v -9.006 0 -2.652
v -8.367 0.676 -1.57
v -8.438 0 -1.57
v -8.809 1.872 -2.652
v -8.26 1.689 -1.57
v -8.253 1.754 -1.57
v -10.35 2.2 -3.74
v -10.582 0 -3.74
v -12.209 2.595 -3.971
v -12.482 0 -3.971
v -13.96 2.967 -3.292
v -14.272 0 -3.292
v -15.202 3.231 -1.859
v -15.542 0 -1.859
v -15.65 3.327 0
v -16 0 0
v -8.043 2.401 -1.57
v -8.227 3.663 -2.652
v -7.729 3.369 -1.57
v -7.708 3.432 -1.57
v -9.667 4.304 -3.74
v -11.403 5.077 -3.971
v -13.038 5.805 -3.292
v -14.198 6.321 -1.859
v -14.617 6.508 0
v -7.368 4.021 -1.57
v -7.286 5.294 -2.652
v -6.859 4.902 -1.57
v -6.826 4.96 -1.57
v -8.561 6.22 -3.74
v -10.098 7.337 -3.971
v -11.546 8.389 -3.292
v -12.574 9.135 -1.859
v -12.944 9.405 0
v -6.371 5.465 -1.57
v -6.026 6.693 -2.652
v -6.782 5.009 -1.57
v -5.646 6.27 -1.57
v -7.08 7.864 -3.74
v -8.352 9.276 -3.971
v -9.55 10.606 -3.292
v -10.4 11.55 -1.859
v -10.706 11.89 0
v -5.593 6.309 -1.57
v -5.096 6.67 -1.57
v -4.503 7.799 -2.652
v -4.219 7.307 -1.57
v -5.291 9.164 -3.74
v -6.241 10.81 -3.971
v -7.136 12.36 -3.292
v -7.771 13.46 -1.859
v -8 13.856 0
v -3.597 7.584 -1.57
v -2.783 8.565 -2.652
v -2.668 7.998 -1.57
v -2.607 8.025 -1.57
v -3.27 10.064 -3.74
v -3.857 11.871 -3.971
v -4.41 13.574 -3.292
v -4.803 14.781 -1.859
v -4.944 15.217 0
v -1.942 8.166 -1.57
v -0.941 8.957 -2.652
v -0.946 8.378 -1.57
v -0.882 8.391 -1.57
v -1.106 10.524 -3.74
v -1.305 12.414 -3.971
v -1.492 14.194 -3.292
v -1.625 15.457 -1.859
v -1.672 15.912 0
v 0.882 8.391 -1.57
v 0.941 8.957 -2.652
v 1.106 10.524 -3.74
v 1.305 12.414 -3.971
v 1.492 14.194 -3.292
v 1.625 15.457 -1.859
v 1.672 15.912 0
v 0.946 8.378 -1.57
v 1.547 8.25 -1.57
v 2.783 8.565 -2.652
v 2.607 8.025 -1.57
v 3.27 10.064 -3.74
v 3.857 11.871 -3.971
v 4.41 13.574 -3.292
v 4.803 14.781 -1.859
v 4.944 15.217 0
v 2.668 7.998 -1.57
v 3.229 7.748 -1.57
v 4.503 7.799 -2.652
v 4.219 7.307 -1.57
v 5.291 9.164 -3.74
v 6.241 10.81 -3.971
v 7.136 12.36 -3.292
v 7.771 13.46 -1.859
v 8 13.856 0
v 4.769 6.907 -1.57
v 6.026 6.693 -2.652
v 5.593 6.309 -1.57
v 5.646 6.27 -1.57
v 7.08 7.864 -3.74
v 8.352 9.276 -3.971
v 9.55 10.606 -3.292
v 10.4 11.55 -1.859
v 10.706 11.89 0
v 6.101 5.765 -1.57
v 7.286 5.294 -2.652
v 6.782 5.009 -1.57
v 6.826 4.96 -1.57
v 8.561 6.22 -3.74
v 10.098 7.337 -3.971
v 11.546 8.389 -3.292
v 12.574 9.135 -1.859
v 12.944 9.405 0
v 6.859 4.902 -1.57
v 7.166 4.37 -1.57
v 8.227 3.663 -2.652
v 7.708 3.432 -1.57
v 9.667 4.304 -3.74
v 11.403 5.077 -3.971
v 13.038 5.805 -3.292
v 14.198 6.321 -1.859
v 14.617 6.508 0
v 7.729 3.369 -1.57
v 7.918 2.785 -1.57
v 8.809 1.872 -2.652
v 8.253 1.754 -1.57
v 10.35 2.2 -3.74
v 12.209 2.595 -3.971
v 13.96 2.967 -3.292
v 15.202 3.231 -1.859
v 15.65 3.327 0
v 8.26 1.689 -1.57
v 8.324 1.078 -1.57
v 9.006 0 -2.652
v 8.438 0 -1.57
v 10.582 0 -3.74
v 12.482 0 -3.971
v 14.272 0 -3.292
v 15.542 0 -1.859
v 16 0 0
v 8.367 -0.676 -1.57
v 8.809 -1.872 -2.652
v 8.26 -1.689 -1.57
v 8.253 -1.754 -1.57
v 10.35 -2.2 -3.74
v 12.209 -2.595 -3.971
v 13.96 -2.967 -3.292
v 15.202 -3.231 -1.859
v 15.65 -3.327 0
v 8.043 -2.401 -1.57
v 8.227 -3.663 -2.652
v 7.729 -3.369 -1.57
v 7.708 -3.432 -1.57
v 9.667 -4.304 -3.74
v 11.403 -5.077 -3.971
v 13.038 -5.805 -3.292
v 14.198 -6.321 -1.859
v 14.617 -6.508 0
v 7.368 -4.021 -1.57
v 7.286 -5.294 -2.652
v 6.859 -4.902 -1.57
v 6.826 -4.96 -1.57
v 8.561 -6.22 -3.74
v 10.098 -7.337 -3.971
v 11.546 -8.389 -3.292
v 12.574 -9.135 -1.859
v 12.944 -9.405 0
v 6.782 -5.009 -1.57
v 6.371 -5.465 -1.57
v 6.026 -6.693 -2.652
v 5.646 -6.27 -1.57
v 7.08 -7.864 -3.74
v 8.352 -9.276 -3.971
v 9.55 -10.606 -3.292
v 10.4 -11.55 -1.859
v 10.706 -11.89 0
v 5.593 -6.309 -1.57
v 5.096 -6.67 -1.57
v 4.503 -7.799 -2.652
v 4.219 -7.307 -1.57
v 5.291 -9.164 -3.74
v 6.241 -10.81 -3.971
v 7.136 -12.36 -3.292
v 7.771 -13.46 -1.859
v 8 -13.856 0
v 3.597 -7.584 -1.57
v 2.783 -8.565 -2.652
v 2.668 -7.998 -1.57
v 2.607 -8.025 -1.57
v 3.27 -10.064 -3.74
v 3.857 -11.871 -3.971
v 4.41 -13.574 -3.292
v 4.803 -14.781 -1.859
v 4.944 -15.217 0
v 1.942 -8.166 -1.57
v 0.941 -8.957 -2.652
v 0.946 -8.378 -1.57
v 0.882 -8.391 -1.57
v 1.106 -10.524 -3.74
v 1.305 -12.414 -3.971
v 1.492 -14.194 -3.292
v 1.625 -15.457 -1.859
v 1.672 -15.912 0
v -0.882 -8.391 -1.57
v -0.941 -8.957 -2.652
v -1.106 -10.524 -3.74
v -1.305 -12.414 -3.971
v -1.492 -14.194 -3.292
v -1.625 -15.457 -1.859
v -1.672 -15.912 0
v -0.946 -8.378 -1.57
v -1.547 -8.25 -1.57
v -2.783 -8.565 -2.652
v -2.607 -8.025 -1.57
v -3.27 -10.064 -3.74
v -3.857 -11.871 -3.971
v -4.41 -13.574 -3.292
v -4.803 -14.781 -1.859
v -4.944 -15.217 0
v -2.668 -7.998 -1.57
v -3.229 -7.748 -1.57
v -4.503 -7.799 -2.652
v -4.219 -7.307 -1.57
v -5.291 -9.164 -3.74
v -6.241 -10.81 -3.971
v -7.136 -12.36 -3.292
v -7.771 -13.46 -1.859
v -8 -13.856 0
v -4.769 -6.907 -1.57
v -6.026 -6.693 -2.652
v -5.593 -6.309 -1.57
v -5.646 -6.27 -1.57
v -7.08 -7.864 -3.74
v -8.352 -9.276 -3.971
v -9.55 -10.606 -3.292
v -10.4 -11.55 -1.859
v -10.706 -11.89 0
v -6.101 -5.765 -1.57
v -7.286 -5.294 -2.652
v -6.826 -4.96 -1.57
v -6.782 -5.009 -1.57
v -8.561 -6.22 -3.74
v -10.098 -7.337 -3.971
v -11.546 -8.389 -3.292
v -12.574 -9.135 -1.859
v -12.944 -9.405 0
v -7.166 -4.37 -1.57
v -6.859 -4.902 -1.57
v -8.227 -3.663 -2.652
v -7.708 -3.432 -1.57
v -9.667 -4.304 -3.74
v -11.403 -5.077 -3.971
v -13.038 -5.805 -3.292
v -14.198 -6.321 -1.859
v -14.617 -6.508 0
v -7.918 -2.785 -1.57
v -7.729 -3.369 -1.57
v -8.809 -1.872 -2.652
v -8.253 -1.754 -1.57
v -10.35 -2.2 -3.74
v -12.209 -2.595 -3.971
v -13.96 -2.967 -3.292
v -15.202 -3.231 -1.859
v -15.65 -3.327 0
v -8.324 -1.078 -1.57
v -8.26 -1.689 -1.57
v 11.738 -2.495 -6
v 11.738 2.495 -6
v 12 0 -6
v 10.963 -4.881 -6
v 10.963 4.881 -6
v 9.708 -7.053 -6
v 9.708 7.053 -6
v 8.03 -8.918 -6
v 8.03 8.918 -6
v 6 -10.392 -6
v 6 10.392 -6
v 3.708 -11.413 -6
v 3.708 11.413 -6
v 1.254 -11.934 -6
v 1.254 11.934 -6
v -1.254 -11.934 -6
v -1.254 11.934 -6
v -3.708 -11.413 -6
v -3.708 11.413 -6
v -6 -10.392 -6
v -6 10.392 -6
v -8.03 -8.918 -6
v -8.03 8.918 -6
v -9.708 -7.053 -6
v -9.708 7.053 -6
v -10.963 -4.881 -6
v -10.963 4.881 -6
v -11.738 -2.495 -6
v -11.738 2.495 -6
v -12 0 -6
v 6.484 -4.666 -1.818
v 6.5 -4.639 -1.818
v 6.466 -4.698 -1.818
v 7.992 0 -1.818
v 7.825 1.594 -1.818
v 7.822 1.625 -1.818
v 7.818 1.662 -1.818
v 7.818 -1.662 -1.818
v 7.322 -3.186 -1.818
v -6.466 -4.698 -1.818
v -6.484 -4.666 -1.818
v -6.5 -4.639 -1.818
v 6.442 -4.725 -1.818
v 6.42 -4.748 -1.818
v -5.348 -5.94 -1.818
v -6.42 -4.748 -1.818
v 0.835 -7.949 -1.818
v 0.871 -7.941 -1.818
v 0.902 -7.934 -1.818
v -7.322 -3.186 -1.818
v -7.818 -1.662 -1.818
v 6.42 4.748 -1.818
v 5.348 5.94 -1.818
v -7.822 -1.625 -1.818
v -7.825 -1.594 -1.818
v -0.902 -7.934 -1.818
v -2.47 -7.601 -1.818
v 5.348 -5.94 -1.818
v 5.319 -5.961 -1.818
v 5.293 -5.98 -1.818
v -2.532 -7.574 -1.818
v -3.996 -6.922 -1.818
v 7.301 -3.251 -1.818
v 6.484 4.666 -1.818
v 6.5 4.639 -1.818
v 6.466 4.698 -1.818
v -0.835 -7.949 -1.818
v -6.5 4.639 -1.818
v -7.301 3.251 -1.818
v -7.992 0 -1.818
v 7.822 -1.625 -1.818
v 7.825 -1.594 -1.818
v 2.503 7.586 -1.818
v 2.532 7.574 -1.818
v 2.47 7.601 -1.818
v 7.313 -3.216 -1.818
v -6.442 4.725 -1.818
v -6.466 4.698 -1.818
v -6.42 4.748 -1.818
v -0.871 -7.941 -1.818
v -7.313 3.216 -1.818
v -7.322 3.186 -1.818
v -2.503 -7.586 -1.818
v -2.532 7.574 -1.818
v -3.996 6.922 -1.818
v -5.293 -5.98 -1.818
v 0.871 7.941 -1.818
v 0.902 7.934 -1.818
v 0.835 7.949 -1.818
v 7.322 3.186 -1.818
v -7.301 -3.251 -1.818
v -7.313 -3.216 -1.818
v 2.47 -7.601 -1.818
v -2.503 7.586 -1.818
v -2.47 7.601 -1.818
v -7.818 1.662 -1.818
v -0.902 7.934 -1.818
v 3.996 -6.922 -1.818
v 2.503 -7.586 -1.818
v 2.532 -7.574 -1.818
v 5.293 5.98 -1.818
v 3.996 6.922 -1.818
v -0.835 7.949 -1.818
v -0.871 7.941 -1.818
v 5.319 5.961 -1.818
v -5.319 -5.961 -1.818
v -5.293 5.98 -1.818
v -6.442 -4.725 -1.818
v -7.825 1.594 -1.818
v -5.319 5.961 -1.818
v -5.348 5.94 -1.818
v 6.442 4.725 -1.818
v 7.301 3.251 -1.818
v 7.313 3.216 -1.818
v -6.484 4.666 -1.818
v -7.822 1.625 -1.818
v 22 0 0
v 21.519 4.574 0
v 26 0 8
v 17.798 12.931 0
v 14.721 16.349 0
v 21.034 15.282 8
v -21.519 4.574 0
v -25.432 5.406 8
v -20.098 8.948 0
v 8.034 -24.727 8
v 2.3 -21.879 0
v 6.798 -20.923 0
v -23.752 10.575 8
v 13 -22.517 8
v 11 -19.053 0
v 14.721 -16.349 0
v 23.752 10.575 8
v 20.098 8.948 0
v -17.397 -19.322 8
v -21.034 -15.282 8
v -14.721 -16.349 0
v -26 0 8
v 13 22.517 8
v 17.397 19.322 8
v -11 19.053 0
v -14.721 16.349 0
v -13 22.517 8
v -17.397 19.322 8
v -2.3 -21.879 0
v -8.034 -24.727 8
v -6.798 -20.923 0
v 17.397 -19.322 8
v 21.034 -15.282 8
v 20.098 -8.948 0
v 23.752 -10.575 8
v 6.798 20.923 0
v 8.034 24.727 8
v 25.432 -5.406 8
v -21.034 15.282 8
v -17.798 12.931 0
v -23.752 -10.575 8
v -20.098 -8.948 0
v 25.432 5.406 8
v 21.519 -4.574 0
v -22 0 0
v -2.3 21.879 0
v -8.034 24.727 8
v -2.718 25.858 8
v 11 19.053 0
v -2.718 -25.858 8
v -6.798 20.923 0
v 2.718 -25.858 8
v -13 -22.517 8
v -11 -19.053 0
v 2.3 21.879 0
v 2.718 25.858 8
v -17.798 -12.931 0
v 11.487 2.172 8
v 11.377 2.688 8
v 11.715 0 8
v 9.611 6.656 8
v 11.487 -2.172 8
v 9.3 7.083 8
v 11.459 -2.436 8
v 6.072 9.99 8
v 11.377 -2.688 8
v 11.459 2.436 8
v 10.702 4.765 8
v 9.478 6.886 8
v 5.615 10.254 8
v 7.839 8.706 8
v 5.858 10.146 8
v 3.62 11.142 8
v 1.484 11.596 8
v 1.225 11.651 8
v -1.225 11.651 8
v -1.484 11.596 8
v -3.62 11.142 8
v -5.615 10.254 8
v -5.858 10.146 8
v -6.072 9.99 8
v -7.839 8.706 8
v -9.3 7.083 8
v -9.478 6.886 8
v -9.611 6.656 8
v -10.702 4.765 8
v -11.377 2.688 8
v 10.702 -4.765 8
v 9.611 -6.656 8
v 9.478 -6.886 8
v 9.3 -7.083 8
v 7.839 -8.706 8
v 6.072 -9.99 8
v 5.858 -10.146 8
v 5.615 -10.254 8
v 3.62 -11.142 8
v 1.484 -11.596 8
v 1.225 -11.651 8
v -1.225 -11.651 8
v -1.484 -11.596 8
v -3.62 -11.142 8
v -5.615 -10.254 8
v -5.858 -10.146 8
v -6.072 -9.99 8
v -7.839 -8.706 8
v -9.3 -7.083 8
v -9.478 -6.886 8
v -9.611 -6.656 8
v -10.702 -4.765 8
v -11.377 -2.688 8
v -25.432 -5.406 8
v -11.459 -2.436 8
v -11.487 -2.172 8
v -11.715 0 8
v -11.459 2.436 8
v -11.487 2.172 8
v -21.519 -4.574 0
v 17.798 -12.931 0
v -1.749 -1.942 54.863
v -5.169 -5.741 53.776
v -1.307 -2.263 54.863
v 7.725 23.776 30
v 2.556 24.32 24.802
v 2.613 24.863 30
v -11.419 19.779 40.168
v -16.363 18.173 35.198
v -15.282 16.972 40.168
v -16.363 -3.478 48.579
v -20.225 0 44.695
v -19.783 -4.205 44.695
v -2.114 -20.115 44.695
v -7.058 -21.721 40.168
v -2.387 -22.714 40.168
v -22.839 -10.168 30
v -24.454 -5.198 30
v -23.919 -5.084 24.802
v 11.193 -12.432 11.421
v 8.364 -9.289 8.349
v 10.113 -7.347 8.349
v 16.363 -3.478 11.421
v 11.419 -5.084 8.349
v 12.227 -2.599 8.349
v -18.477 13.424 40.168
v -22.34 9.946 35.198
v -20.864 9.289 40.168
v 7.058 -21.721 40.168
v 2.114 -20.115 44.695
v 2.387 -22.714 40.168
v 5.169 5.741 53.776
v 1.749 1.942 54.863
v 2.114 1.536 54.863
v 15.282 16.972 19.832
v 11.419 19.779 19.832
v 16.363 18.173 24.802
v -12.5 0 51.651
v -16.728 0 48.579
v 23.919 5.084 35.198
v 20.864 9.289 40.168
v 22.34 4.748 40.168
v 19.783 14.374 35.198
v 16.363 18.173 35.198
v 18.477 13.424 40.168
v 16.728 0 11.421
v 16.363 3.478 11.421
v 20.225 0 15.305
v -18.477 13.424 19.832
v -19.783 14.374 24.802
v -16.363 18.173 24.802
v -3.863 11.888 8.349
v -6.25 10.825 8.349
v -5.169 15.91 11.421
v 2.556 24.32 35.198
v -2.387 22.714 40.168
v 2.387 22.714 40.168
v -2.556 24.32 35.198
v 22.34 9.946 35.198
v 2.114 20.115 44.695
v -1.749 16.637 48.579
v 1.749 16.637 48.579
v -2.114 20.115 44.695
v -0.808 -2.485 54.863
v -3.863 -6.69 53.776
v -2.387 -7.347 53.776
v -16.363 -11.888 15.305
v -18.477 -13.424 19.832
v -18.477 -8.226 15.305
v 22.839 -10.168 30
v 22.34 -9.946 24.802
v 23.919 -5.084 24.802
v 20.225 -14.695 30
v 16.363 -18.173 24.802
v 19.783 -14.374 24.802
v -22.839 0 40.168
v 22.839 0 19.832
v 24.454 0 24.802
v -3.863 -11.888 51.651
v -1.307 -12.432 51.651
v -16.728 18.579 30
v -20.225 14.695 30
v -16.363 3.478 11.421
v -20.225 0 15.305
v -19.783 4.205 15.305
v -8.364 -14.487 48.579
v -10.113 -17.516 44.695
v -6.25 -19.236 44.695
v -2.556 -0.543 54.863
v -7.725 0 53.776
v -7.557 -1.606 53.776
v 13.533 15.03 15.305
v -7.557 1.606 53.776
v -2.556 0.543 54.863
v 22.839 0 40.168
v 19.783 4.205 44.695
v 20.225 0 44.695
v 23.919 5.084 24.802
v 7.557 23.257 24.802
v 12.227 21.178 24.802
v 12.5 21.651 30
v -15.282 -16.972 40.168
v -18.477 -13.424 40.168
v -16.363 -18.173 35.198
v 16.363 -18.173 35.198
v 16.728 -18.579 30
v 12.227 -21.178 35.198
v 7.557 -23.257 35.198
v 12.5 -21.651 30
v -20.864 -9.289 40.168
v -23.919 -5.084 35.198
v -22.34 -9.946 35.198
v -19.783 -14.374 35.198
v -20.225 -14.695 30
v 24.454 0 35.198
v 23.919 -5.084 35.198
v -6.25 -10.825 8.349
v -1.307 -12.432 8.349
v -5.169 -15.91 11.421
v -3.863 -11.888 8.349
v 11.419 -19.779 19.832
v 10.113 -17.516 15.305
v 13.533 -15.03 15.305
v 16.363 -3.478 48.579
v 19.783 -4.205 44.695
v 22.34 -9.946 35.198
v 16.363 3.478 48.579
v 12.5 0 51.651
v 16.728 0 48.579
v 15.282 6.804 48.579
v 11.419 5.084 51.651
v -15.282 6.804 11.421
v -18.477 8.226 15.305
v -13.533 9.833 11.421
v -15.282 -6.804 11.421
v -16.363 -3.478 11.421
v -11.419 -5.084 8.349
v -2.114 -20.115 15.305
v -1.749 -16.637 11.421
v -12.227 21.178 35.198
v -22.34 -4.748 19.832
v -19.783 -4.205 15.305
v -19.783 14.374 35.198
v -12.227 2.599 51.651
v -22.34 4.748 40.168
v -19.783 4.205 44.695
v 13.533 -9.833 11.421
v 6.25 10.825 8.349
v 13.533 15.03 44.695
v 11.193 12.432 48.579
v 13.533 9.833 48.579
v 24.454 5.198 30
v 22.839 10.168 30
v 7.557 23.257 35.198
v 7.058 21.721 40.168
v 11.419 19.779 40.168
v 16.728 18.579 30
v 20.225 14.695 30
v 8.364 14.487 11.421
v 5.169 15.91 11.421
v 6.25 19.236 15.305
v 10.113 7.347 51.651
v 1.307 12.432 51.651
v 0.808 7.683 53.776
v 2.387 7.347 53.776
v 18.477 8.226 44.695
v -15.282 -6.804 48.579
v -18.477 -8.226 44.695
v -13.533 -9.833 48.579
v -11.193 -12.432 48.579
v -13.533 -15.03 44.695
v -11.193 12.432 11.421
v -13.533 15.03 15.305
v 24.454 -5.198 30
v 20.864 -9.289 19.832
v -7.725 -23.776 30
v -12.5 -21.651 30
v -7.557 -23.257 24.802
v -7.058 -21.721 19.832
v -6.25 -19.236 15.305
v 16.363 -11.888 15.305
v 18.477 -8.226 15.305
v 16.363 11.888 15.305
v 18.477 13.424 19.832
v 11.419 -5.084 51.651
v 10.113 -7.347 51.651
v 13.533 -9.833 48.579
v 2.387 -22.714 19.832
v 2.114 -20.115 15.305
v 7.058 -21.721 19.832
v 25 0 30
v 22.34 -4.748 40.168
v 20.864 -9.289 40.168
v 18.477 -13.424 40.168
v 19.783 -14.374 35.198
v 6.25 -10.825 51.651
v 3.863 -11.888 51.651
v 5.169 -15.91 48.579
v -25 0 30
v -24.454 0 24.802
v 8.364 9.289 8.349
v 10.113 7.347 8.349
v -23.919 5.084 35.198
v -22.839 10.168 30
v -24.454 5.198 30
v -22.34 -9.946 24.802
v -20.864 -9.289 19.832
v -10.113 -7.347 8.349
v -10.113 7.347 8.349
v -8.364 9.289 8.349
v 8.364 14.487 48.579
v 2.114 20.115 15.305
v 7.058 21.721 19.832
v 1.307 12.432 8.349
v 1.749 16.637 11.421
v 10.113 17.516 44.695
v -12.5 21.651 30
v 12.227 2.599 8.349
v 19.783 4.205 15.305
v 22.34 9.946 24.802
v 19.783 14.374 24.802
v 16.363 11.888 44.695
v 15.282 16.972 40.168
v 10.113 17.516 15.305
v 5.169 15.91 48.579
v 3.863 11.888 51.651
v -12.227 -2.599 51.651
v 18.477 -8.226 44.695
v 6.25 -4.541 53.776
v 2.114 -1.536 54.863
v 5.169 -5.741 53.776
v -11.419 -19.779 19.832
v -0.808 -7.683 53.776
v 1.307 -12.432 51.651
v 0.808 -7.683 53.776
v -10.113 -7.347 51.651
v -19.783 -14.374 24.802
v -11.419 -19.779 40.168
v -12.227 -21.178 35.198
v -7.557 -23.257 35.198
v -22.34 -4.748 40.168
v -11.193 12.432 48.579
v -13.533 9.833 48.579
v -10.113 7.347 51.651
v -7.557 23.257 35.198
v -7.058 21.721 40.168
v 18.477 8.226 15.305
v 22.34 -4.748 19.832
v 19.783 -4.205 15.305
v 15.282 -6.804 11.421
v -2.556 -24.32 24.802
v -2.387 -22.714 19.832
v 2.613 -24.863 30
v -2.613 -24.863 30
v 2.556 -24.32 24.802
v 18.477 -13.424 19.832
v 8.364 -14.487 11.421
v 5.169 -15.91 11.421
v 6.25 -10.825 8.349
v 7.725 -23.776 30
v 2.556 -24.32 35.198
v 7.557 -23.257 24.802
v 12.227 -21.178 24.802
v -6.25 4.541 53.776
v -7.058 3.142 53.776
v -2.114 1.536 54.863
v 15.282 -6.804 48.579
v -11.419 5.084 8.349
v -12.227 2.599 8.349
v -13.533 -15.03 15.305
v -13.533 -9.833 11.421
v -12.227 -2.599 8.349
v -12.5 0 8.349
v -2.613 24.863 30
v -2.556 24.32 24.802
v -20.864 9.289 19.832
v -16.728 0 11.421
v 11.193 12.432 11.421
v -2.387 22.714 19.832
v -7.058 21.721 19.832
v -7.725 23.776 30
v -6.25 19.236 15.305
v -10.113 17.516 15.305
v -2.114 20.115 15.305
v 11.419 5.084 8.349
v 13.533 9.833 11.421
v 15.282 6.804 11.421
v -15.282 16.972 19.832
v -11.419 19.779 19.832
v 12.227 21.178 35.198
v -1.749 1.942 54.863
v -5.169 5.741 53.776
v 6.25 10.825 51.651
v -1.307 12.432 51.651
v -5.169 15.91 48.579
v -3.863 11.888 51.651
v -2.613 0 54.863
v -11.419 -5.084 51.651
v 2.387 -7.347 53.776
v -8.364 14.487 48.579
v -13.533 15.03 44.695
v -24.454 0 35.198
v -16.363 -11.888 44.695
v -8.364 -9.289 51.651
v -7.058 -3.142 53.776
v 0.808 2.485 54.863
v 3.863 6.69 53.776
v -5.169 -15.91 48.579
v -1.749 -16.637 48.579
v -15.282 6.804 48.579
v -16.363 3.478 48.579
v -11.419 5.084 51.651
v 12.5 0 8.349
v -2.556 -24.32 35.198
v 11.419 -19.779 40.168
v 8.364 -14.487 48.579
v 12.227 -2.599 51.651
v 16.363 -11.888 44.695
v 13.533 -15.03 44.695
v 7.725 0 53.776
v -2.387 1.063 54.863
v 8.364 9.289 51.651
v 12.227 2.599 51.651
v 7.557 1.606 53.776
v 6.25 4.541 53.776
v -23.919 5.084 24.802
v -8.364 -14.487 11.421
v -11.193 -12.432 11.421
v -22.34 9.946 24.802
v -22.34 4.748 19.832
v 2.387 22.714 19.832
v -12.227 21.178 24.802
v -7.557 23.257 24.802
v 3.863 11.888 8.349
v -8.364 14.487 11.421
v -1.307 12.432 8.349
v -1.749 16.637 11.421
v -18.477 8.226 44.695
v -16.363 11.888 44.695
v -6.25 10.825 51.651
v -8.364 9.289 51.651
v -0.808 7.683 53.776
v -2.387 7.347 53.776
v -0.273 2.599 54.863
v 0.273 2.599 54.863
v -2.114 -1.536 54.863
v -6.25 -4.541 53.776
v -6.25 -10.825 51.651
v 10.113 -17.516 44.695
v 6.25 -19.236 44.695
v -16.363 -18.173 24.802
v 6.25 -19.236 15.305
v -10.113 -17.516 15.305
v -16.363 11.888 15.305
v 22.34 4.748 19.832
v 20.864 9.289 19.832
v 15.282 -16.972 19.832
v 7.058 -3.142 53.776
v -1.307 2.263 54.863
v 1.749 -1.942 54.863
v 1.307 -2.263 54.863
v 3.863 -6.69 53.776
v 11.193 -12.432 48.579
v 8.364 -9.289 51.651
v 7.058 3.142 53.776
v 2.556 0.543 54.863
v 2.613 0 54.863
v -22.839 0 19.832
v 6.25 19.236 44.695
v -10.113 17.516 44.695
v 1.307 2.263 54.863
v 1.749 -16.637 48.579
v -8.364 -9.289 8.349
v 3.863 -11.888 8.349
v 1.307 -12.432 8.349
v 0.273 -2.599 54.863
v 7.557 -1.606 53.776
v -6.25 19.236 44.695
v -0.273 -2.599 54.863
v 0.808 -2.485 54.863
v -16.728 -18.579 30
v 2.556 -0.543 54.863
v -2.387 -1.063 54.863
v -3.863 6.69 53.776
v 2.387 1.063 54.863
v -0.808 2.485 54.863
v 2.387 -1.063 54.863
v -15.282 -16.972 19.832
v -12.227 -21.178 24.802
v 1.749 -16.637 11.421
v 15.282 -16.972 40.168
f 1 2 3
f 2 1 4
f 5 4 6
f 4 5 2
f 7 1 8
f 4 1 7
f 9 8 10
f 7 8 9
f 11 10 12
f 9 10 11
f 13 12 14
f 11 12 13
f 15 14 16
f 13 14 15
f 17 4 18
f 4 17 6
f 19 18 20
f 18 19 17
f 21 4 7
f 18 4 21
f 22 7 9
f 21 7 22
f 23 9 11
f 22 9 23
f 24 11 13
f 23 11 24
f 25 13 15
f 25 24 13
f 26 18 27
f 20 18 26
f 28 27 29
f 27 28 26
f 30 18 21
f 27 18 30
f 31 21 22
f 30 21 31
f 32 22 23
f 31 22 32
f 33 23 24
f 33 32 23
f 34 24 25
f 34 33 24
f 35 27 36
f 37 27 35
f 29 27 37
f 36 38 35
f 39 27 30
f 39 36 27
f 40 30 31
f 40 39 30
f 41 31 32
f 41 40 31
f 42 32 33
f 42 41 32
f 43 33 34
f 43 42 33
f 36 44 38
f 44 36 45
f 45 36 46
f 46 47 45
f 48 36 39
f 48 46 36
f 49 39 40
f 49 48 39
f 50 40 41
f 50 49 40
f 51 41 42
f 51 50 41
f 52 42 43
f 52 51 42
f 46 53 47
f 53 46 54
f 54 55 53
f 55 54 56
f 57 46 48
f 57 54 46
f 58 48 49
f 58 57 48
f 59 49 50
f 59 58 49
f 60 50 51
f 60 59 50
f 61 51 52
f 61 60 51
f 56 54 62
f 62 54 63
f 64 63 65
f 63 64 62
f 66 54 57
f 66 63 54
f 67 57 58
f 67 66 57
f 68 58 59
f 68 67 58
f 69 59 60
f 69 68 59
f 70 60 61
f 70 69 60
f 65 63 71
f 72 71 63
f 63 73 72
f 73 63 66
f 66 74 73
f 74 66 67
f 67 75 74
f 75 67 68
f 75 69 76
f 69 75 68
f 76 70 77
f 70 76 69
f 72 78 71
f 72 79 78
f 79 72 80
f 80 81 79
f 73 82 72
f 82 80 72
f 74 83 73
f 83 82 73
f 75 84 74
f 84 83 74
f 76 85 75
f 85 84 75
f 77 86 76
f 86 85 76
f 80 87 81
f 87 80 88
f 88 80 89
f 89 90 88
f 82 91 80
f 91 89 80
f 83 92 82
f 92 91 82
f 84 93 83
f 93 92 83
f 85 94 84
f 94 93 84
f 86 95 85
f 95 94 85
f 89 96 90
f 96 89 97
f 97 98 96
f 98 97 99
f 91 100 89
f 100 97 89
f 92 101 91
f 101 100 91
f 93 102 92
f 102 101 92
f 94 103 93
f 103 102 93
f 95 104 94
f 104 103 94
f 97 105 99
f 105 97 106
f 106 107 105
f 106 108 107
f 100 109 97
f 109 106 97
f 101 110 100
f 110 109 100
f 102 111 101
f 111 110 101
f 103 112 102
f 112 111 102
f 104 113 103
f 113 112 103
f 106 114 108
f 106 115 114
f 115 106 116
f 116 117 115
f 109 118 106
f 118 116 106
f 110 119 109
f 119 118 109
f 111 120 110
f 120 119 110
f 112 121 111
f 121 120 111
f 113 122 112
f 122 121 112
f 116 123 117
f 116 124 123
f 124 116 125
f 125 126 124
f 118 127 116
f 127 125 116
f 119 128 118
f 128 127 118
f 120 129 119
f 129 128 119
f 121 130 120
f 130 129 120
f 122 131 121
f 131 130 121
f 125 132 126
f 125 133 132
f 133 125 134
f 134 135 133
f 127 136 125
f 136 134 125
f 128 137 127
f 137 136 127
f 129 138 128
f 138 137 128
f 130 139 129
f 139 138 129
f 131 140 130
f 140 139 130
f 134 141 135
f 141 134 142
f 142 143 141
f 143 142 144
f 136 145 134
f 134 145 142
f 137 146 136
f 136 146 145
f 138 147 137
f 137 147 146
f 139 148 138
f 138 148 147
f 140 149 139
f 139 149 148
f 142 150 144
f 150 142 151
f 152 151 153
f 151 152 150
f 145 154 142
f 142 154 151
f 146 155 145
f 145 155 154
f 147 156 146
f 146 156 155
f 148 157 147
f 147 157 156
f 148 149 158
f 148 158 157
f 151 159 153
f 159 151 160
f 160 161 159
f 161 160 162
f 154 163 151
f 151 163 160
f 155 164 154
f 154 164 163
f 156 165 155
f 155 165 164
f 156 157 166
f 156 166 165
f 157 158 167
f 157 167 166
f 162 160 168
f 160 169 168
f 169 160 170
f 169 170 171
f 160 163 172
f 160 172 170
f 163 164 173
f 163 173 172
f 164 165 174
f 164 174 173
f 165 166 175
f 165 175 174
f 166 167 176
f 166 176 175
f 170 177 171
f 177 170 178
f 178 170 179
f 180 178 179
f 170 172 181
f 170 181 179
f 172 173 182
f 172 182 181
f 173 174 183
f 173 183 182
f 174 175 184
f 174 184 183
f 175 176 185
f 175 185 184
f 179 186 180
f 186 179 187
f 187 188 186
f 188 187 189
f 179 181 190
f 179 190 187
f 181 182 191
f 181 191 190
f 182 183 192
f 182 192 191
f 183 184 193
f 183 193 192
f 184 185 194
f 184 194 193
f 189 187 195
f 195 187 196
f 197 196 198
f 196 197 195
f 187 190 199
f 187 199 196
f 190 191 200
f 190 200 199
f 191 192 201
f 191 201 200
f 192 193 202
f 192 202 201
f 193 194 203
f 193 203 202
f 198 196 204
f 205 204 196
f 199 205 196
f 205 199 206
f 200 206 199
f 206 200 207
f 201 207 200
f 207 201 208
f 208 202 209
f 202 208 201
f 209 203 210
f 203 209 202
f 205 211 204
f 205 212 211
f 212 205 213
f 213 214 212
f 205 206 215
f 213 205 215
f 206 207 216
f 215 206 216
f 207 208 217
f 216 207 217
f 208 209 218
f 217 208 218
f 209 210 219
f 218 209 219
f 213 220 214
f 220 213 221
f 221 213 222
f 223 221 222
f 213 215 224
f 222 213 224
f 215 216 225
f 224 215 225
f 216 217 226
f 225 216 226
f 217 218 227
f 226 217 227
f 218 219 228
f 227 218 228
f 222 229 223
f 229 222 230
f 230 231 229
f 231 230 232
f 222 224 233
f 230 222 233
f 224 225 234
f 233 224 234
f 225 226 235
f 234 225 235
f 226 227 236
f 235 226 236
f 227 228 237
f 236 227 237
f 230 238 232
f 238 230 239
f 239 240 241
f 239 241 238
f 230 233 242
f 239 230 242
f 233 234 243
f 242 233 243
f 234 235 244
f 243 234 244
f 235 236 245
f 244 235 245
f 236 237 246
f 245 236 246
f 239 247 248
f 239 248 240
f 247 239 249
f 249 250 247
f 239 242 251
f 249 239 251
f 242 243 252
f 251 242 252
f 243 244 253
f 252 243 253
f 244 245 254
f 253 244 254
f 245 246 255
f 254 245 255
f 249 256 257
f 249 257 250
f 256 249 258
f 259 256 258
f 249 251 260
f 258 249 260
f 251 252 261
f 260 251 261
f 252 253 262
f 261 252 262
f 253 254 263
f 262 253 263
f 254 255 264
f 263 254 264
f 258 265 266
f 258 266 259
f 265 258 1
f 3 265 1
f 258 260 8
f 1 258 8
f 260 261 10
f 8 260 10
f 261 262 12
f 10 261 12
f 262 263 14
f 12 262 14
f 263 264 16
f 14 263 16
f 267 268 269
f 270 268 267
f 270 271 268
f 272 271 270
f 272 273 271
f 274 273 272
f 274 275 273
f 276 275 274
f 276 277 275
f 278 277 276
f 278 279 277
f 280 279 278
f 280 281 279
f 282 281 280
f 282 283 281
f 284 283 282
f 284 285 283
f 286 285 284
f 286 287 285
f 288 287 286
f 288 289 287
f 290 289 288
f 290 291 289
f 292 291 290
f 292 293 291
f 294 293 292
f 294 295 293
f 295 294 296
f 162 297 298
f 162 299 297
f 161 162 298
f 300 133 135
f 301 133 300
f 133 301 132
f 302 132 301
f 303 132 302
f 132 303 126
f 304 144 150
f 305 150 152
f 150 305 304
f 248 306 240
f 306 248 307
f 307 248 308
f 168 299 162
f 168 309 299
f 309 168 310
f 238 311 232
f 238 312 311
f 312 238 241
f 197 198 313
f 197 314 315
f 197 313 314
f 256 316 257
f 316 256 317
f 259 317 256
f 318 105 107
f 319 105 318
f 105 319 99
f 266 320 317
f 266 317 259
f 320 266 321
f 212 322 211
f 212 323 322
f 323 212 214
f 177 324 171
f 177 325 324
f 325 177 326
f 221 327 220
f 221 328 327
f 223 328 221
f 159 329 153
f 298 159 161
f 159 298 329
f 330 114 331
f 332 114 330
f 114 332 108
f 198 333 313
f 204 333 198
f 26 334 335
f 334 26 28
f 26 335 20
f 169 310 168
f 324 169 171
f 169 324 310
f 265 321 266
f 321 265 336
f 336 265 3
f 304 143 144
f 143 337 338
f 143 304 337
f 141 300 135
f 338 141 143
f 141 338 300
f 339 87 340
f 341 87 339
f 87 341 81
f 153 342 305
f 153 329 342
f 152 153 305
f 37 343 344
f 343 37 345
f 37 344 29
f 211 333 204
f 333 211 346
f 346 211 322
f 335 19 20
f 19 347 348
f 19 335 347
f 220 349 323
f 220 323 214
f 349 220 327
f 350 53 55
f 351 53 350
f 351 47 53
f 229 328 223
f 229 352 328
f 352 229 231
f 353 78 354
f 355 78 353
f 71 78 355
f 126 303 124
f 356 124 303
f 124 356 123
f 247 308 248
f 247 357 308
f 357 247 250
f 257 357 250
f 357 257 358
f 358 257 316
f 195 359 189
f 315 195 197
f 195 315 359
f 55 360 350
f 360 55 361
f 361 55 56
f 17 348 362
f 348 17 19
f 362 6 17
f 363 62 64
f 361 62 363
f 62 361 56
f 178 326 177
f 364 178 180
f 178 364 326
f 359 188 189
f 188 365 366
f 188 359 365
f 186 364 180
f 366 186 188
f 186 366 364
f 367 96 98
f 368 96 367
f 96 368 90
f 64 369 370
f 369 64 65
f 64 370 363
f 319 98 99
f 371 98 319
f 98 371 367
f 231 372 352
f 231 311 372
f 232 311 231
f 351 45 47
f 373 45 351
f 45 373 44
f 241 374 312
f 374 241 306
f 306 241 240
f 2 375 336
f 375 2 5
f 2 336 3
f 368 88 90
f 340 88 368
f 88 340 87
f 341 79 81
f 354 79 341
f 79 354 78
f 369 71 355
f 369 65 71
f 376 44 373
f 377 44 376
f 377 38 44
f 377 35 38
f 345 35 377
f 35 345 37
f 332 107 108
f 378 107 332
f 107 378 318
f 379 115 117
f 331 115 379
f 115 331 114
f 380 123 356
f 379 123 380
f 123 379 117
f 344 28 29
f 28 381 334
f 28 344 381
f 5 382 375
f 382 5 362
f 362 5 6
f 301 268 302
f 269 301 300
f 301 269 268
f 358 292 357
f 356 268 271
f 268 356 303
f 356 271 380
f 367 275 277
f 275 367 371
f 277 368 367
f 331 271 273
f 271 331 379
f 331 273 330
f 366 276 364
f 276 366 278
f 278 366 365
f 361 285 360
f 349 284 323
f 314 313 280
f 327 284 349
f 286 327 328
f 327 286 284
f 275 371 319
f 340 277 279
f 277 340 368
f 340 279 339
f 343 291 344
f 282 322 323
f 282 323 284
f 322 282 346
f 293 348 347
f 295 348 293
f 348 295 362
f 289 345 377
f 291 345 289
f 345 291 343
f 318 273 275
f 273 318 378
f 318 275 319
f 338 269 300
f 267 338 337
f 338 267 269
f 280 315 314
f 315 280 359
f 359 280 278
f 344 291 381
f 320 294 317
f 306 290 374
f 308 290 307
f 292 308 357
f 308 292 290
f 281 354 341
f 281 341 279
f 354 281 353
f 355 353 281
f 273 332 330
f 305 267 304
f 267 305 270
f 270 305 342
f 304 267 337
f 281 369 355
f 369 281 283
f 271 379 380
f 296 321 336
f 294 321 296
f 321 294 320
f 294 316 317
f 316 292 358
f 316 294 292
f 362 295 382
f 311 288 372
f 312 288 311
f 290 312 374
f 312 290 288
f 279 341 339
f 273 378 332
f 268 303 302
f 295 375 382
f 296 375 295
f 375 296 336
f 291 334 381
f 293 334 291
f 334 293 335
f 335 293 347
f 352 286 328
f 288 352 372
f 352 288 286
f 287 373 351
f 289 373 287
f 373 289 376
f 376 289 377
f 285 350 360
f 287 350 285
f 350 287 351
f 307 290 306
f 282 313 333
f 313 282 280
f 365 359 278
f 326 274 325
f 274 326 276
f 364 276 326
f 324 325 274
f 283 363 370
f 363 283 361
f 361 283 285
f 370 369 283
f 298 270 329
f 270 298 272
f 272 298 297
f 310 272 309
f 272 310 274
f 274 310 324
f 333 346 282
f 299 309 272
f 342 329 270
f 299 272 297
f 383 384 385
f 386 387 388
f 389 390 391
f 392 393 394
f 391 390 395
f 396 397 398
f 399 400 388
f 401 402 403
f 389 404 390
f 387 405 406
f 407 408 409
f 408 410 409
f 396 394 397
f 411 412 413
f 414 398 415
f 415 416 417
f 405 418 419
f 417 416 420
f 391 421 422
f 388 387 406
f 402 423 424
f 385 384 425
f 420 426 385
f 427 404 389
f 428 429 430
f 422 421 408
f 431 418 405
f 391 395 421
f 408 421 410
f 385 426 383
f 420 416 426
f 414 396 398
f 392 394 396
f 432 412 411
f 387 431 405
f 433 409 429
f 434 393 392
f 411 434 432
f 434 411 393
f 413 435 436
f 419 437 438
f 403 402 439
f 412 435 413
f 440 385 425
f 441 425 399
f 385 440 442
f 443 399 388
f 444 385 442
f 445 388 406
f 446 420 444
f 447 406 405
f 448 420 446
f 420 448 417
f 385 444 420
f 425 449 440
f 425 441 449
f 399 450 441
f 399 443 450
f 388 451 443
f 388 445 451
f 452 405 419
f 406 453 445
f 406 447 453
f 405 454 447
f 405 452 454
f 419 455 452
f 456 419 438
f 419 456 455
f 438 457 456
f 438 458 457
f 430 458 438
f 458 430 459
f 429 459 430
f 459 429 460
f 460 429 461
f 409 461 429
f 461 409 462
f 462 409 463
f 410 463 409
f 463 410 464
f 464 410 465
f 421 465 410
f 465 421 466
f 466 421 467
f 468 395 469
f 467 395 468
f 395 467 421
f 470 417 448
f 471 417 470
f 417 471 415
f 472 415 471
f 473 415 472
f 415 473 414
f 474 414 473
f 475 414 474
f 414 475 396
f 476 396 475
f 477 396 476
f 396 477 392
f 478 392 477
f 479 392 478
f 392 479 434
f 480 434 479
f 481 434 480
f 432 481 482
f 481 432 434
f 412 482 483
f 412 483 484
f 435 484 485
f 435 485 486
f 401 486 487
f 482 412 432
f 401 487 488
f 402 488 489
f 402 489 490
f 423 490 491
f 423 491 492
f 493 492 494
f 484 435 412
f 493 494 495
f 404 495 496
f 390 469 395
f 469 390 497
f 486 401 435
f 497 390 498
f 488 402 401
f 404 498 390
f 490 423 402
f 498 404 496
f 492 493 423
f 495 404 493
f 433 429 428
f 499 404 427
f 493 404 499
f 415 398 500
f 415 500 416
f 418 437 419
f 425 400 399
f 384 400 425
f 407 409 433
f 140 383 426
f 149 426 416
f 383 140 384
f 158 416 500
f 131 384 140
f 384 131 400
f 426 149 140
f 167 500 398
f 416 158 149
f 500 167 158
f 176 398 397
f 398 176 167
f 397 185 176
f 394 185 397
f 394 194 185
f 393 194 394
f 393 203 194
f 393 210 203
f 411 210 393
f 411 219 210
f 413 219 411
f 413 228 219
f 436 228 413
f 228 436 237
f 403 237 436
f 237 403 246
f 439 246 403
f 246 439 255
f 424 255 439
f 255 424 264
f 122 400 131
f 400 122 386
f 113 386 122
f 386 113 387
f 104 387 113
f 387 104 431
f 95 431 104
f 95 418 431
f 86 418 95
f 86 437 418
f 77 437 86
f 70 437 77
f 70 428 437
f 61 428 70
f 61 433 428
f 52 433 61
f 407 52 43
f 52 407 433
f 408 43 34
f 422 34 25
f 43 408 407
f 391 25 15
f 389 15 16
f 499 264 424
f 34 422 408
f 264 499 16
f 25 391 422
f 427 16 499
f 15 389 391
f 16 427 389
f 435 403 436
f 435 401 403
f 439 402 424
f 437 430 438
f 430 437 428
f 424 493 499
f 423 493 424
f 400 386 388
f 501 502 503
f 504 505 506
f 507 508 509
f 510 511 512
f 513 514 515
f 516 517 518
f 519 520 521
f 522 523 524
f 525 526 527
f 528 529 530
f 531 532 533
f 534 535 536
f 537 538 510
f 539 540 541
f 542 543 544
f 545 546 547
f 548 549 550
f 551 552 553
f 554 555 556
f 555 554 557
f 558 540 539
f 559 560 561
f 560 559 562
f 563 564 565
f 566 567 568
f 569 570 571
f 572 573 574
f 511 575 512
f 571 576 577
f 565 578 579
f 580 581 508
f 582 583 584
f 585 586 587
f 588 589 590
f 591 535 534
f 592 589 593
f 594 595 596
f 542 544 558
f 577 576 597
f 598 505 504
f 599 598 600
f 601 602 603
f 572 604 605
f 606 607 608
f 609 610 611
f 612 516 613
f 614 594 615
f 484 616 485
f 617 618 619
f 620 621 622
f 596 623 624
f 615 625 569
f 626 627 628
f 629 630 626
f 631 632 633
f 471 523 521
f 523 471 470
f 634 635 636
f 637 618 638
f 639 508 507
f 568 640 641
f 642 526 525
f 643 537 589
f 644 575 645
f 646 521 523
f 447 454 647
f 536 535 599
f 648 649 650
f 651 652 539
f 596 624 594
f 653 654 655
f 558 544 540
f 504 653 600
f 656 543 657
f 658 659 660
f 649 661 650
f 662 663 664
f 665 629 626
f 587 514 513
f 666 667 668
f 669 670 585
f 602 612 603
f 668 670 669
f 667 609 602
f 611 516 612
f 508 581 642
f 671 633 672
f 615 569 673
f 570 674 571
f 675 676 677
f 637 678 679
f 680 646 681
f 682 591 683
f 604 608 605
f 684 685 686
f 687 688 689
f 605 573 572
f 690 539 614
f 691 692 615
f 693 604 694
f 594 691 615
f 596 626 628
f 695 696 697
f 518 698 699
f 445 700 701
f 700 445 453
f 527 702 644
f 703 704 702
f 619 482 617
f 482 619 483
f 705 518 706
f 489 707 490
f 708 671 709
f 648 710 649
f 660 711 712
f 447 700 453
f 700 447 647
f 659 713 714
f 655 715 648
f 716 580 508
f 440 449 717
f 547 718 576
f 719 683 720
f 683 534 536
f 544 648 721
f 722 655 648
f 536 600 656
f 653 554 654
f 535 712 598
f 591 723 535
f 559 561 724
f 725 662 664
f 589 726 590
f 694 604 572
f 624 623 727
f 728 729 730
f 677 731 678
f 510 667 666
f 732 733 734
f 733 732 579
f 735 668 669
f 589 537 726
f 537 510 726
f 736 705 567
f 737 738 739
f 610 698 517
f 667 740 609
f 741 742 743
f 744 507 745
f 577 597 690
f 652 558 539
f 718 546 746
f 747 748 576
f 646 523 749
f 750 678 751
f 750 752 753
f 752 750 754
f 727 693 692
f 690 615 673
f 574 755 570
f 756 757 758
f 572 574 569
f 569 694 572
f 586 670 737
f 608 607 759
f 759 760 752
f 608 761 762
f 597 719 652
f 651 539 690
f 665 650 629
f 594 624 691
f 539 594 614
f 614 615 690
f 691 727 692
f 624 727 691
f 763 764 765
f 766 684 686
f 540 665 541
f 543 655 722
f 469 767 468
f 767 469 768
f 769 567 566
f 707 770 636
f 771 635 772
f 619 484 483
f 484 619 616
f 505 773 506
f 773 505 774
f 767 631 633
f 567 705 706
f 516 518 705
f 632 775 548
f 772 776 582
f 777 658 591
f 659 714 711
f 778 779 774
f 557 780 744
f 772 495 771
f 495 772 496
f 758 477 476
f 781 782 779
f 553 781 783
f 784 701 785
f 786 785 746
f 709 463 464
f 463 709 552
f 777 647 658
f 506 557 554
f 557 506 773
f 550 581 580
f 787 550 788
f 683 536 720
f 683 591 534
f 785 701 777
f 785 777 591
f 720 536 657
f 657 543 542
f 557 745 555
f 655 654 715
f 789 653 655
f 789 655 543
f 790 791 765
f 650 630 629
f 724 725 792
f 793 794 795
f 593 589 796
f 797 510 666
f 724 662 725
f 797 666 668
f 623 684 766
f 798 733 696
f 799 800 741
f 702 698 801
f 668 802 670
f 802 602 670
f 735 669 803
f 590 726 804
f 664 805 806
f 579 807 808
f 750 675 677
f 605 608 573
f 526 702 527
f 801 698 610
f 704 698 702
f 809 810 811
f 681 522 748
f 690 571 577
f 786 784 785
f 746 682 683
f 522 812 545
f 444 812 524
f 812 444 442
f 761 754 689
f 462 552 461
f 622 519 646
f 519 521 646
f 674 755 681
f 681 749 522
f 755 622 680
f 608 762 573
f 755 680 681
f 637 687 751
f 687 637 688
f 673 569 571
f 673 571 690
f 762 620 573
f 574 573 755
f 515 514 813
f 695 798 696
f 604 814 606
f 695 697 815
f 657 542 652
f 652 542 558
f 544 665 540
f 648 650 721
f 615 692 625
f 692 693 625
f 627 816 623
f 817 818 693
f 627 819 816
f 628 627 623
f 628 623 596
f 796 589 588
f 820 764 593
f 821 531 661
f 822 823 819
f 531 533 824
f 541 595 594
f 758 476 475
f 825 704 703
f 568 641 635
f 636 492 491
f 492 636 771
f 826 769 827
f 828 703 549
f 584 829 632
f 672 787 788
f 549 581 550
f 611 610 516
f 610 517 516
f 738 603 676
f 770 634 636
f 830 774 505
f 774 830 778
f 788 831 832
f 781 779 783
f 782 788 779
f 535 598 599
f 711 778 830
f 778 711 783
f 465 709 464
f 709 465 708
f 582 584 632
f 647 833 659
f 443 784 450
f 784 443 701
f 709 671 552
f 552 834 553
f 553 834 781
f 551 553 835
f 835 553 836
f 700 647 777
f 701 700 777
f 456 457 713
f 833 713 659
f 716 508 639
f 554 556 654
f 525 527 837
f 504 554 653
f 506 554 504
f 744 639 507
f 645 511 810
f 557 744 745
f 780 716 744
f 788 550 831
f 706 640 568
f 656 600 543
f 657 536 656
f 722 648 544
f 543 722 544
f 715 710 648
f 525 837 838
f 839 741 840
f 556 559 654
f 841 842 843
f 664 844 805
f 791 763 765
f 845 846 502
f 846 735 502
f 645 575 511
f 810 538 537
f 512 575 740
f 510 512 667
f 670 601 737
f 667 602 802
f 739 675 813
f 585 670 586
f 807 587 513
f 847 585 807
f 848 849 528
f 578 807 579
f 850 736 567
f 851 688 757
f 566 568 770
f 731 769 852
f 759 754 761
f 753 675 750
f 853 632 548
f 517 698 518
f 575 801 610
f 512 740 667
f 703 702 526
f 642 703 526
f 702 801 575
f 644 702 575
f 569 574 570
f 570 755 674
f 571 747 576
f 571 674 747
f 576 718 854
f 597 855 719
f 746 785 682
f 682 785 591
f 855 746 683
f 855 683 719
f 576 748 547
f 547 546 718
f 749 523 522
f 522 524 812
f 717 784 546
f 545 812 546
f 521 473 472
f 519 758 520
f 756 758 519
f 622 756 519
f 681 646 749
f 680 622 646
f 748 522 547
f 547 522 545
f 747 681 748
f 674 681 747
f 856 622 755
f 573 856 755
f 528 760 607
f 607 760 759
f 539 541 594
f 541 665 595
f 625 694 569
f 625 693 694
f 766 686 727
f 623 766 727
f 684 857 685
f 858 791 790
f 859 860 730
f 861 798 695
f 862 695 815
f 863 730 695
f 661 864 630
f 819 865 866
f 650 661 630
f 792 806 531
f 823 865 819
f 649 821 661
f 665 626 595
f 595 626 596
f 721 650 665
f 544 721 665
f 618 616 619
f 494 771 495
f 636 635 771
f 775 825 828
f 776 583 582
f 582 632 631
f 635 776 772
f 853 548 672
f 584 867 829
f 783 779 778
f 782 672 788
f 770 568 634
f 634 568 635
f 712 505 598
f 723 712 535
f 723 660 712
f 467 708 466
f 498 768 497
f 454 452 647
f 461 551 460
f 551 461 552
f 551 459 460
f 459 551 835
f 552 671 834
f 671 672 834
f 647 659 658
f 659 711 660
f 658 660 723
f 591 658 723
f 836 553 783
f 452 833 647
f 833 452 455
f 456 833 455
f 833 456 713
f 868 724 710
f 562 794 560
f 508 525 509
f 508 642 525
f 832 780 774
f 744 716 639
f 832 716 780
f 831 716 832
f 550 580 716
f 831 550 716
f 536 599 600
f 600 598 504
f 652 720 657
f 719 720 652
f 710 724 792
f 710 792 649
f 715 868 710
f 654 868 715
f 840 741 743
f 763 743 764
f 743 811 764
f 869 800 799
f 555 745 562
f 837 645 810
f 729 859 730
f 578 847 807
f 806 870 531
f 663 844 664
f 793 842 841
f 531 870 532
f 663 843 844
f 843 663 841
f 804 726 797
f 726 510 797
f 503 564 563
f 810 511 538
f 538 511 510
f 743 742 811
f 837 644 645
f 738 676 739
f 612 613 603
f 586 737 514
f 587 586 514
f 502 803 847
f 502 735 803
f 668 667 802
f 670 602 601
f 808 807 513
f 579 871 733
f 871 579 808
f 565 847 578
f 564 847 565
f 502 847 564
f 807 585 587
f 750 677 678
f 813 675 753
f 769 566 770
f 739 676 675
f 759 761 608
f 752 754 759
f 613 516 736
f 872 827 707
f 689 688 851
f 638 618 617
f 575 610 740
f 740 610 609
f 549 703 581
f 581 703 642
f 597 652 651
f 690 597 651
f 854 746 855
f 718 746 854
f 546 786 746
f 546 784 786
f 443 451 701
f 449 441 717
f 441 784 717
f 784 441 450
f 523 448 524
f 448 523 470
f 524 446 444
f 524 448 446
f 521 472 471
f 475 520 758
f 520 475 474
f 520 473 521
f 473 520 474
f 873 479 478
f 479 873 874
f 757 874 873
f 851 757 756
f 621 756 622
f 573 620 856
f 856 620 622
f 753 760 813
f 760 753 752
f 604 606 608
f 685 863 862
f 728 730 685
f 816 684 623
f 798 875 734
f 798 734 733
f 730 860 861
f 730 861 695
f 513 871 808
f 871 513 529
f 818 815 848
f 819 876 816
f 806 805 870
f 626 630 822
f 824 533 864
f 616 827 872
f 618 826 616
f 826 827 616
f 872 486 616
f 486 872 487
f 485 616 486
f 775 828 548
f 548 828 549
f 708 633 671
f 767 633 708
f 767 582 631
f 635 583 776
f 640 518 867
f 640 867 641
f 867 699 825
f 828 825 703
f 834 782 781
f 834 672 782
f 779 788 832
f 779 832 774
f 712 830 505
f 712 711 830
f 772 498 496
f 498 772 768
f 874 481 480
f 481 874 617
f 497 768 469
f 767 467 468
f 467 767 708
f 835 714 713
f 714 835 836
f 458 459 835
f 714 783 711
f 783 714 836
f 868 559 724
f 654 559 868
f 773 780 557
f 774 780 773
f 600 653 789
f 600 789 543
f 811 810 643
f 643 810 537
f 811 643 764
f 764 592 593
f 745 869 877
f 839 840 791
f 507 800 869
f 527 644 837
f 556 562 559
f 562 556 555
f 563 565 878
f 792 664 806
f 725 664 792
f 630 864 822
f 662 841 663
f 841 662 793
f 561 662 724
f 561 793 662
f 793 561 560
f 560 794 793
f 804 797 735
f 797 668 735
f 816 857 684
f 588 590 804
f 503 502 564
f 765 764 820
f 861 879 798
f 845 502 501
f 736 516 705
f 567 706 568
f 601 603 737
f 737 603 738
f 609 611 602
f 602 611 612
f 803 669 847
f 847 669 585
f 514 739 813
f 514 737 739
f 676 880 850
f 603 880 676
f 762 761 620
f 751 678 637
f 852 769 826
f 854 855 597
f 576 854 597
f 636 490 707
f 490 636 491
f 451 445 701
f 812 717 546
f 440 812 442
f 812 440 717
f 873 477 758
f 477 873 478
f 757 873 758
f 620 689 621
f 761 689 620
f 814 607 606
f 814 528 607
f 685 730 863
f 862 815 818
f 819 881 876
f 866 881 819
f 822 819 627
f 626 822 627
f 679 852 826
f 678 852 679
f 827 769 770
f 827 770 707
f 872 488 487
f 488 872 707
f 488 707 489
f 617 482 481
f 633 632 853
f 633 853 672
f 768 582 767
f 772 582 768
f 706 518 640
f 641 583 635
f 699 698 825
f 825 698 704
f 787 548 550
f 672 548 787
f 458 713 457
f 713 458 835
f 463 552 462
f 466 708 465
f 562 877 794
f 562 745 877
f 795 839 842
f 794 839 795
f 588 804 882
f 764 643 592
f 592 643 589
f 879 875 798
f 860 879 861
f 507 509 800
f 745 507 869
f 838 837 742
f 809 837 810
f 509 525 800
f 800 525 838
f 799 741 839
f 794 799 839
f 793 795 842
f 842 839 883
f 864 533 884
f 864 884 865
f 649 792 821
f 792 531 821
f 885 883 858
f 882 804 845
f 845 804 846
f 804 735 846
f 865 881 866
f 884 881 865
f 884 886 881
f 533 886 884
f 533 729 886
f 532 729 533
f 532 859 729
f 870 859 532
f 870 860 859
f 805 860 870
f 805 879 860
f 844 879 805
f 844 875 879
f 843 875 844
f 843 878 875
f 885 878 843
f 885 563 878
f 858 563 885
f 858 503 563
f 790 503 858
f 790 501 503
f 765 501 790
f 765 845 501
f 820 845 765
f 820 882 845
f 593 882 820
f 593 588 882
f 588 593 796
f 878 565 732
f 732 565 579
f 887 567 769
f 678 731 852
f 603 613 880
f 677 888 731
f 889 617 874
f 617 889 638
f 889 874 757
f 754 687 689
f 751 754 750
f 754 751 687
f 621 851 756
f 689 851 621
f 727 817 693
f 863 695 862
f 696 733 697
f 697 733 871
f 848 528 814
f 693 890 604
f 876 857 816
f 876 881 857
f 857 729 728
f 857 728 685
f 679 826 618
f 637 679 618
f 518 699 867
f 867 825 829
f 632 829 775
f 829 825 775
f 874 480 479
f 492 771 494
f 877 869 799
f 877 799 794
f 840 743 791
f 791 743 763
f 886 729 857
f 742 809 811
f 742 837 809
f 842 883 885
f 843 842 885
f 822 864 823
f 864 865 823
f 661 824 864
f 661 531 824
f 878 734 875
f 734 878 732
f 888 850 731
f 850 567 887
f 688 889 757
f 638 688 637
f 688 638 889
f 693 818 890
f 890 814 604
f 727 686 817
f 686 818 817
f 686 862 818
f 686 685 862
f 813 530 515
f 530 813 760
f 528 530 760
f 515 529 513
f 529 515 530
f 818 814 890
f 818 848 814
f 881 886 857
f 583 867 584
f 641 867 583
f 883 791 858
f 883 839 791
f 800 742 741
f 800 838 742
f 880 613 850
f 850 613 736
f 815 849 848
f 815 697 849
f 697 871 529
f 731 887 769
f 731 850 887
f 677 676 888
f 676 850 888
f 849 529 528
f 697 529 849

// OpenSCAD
/*
This is the Teacher's
Edition of the trophy,
used for grading purposes.
*/

//Block One - Question One & Two's Answers Go Here! ->

color("DarkRed") rotate_extrude(convexity = 18) translate([12, 0, 2]) circle(r = 4);

//Block Two - Question Three & Four's Answers Go Here! ->
color("Gold") 
    cylinder(h=12, r1=0.5, r2=22, center = true);

//Block Three - Question Five & Six's Answers Go Here! ->
color("Gold") 
    translate([0,0,-6])
    cylinder(h=12, r1=12, r2=0.5, center = false); 
    
//Block Four - Question Seven & Eight's Answers Go Here! ->  
color("Gold") 
    translate([0,0,4])
    cylinder(h=8, r1=22, r2=26, center = true);

//Block Five - Question Nine & Ten's Answers Go Here! ->  
color("Gold") 
    translate([0,0,30])
    sphere(25); 
